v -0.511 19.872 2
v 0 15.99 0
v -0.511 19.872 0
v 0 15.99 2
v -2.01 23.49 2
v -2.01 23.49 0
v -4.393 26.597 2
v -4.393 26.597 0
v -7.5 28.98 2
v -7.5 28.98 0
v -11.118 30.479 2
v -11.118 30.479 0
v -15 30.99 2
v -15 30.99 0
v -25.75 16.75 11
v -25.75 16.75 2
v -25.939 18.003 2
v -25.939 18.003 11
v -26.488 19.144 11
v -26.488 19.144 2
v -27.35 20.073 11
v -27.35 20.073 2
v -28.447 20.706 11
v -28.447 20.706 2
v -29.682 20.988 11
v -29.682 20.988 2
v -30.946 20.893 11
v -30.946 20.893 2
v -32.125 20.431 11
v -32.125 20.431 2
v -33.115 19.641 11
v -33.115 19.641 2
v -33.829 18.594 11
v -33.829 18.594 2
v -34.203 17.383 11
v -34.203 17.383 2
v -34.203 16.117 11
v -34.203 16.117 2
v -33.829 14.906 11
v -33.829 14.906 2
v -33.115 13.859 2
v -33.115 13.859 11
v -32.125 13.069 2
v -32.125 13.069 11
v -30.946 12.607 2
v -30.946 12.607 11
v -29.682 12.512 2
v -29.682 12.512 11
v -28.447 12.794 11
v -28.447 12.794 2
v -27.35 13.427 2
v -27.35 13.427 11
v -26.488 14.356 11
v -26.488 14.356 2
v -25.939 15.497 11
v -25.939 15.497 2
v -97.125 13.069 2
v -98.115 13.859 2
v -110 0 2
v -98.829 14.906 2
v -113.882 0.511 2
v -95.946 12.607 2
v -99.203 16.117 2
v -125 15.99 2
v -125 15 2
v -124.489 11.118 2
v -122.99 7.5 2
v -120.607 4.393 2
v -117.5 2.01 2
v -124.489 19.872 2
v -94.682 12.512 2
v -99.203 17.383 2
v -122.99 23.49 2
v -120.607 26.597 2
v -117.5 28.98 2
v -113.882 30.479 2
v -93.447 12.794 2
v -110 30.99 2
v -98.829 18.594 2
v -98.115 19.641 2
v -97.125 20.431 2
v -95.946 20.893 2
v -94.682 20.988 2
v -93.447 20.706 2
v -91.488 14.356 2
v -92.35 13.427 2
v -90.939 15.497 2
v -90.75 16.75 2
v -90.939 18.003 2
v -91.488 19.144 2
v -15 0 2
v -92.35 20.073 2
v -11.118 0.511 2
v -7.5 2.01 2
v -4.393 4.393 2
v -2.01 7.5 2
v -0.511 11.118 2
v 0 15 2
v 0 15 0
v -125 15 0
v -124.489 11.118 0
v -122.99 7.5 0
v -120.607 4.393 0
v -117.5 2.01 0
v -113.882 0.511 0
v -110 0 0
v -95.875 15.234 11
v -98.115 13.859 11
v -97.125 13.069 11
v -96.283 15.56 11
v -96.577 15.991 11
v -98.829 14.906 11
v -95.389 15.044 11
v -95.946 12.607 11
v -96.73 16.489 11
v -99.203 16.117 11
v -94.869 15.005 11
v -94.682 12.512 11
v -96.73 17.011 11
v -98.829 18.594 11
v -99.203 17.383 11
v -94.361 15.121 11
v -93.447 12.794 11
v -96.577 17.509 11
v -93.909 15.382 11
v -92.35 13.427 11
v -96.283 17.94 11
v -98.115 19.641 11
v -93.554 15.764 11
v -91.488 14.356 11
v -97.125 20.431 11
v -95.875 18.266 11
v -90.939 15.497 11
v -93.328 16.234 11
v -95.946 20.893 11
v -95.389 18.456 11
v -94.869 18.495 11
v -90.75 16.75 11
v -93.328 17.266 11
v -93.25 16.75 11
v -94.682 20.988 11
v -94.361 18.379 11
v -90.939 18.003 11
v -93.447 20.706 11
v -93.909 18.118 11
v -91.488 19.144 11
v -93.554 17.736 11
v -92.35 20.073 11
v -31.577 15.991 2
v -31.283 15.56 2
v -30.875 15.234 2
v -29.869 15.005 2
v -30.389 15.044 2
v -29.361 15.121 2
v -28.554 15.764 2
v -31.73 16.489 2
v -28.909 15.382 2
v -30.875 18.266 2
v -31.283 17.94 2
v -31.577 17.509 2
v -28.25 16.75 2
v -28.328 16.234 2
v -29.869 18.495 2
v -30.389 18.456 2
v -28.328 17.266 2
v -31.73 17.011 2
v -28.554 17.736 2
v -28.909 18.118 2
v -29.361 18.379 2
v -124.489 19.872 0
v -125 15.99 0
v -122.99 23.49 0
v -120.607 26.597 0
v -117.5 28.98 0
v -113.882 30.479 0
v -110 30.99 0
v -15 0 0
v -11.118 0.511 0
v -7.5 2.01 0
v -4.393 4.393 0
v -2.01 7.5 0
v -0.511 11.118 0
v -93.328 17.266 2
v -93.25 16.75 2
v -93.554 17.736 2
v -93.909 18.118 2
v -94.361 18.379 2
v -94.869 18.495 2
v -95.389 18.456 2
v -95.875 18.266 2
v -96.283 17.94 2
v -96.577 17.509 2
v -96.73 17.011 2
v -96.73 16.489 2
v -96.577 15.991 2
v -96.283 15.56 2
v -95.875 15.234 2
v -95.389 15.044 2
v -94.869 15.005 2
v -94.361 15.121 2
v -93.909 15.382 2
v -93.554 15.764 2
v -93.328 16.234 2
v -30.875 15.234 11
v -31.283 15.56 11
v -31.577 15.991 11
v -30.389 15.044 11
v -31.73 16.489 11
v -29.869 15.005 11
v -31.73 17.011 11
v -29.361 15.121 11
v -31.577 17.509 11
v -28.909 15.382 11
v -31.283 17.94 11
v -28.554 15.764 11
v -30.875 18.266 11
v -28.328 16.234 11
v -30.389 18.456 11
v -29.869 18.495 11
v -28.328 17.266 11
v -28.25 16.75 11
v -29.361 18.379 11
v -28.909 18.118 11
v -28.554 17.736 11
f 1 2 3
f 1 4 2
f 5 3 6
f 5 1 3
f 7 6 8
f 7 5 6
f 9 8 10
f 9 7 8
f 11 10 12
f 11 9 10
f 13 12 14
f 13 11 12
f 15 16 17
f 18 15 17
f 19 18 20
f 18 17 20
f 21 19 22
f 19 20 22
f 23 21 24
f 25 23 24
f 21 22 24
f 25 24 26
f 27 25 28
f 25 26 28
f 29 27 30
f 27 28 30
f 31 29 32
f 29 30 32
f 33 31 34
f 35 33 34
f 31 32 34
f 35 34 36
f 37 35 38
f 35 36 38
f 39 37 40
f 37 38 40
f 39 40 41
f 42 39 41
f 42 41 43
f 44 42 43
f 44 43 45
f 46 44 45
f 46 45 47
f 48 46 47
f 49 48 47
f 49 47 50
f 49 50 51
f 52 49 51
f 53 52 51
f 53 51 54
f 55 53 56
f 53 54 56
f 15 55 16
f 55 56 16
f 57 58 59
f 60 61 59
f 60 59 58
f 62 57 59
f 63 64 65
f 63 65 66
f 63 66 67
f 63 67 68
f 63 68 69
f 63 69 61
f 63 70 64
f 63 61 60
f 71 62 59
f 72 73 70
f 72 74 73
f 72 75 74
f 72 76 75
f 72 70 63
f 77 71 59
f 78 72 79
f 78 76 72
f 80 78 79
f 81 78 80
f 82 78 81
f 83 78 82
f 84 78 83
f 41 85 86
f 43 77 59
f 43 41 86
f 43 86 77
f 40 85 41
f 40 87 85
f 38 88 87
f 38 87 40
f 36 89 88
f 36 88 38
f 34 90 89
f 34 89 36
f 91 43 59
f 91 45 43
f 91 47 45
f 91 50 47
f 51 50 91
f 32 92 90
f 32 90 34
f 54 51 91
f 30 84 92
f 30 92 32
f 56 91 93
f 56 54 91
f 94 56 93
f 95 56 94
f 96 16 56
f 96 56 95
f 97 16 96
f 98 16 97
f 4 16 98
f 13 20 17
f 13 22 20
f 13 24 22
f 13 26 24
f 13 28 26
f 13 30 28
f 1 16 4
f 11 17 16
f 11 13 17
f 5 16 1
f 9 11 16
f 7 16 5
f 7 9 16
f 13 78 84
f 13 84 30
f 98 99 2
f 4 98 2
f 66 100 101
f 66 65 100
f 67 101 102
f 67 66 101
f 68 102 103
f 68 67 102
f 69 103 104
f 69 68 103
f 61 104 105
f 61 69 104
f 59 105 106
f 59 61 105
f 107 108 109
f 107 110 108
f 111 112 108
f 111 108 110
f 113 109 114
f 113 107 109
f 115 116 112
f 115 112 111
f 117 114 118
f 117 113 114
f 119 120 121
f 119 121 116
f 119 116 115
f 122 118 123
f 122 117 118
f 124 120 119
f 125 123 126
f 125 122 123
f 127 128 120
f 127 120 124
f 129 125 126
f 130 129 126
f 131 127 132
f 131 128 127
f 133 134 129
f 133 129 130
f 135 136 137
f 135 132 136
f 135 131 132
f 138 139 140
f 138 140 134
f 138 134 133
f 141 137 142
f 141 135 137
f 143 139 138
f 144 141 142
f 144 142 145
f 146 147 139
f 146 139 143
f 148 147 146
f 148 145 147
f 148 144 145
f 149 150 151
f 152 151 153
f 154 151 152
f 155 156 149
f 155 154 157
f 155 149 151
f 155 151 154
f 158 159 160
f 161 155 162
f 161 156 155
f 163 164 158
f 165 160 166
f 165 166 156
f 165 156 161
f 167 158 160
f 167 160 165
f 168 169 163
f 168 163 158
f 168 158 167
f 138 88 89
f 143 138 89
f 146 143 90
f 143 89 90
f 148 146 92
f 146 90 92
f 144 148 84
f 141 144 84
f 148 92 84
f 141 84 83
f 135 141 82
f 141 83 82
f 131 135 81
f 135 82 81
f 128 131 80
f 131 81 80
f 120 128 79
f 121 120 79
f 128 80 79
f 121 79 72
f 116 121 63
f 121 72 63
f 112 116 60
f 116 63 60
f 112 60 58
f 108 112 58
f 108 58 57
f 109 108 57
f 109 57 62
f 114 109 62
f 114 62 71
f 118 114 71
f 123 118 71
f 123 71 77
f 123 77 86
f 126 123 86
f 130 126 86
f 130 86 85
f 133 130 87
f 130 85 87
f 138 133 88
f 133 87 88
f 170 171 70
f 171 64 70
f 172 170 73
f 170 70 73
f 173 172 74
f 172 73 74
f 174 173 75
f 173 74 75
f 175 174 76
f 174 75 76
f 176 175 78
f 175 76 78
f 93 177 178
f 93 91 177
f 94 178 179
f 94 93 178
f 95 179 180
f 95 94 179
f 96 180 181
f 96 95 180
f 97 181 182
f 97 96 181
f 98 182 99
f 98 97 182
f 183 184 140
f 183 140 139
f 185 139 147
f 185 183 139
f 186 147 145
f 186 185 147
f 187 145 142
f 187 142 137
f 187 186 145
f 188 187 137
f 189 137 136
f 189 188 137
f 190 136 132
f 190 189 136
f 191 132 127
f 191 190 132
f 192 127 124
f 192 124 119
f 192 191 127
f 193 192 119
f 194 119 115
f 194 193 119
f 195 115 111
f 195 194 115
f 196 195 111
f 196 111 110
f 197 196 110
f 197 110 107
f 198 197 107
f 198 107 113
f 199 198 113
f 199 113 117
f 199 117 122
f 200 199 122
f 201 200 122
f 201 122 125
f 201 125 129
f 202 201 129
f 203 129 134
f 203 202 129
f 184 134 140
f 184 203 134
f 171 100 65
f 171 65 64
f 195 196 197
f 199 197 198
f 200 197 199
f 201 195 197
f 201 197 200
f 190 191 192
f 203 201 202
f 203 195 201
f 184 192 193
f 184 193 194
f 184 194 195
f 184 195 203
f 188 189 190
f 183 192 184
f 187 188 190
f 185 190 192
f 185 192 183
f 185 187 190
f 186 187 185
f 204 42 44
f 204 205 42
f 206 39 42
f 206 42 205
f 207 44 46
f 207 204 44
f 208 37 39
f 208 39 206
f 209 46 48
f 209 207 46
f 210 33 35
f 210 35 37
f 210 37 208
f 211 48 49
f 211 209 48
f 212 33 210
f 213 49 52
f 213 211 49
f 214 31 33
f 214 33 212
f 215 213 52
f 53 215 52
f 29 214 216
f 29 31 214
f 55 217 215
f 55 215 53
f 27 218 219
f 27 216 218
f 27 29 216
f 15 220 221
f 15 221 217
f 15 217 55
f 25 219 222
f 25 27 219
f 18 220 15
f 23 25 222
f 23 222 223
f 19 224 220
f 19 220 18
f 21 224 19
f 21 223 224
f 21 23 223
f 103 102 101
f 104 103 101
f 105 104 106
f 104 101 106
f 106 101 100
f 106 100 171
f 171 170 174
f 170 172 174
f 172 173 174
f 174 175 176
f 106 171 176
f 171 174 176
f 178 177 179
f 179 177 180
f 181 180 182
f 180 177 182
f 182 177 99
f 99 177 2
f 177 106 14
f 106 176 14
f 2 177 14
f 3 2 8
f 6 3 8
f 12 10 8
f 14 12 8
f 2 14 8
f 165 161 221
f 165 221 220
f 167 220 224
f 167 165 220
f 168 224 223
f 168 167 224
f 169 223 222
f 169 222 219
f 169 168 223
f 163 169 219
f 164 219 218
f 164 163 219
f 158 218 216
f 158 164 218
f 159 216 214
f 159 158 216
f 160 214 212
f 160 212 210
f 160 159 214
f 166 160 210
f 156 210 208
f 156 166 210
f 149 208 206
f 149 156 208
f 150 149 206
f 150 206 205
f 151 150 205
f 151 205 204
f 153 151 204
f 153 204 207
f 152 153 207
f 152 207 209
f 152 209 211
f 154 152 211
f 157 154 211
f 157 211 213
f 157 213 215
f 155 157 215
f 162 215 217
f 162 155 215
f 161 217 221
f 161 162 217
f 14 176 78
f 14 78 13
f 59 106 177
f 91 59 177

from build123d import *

# Parameters (mm, degrees)
ESQUISSE1_W        = 125
ESQUISSE1_H        = 30.99
BOSS_EXTRU_1_DEPTH = 2
CONG_1_R           = 15
ESQUISSE2_R        = 4.25
ESQUISSE2_R_2      = 1.75
BOSS_EXTRU_2_DEPTH = 9


with BuildPart() as part:
    # Esquisse1 → Boss.-Extru.1 (new body)
    with BuildSketch(Plane.XY):
        with Locations((-62.5, 15.495)):
            Rectangle(ESQUISSE1_W, ESQUISSE1_H)
    extrude(amount=BOSS_EXTRU_1_DEPTH)

    # Congé1
    cong_1_edges = [part.edges().sort_by_distance(p)[0] for p in [
        (0, 0, 1),
        (-125, 0, 1),
        (-125, 30.99, 1),
        (0, 30.99, 1),
    ]]
    fillet(cong_1_edges, radius=CONG_1_R)

    # Esquisse2 → Boss.-Extru.2 (add)
    # profile 1 of 2: a face of its own
    with BuildSketch(Plane.XY.offset(2)):
        with Locations((-95, 16.75)):
            Circle(ESQUISSE2_R)
        with Locations((-95, 16.75)):
            Circle(ESQUISSE2_R_2, mode=Mode.SUBTRACT)
    # profile 2 of 2: a face of its own
    with BuildSketch(Plane.XY.offset(2)):
        with Locations((-30, 16.75)):
            Circle(ESQUISSE2_R)
        with Locations((-30, 16.75)):
            Circle(ESQUISSE2_R_2, mode=Mode.SUBTRACT)
    extrude(amount=BOSS_EXTRU_2_DEPTH)


solid = part.part
